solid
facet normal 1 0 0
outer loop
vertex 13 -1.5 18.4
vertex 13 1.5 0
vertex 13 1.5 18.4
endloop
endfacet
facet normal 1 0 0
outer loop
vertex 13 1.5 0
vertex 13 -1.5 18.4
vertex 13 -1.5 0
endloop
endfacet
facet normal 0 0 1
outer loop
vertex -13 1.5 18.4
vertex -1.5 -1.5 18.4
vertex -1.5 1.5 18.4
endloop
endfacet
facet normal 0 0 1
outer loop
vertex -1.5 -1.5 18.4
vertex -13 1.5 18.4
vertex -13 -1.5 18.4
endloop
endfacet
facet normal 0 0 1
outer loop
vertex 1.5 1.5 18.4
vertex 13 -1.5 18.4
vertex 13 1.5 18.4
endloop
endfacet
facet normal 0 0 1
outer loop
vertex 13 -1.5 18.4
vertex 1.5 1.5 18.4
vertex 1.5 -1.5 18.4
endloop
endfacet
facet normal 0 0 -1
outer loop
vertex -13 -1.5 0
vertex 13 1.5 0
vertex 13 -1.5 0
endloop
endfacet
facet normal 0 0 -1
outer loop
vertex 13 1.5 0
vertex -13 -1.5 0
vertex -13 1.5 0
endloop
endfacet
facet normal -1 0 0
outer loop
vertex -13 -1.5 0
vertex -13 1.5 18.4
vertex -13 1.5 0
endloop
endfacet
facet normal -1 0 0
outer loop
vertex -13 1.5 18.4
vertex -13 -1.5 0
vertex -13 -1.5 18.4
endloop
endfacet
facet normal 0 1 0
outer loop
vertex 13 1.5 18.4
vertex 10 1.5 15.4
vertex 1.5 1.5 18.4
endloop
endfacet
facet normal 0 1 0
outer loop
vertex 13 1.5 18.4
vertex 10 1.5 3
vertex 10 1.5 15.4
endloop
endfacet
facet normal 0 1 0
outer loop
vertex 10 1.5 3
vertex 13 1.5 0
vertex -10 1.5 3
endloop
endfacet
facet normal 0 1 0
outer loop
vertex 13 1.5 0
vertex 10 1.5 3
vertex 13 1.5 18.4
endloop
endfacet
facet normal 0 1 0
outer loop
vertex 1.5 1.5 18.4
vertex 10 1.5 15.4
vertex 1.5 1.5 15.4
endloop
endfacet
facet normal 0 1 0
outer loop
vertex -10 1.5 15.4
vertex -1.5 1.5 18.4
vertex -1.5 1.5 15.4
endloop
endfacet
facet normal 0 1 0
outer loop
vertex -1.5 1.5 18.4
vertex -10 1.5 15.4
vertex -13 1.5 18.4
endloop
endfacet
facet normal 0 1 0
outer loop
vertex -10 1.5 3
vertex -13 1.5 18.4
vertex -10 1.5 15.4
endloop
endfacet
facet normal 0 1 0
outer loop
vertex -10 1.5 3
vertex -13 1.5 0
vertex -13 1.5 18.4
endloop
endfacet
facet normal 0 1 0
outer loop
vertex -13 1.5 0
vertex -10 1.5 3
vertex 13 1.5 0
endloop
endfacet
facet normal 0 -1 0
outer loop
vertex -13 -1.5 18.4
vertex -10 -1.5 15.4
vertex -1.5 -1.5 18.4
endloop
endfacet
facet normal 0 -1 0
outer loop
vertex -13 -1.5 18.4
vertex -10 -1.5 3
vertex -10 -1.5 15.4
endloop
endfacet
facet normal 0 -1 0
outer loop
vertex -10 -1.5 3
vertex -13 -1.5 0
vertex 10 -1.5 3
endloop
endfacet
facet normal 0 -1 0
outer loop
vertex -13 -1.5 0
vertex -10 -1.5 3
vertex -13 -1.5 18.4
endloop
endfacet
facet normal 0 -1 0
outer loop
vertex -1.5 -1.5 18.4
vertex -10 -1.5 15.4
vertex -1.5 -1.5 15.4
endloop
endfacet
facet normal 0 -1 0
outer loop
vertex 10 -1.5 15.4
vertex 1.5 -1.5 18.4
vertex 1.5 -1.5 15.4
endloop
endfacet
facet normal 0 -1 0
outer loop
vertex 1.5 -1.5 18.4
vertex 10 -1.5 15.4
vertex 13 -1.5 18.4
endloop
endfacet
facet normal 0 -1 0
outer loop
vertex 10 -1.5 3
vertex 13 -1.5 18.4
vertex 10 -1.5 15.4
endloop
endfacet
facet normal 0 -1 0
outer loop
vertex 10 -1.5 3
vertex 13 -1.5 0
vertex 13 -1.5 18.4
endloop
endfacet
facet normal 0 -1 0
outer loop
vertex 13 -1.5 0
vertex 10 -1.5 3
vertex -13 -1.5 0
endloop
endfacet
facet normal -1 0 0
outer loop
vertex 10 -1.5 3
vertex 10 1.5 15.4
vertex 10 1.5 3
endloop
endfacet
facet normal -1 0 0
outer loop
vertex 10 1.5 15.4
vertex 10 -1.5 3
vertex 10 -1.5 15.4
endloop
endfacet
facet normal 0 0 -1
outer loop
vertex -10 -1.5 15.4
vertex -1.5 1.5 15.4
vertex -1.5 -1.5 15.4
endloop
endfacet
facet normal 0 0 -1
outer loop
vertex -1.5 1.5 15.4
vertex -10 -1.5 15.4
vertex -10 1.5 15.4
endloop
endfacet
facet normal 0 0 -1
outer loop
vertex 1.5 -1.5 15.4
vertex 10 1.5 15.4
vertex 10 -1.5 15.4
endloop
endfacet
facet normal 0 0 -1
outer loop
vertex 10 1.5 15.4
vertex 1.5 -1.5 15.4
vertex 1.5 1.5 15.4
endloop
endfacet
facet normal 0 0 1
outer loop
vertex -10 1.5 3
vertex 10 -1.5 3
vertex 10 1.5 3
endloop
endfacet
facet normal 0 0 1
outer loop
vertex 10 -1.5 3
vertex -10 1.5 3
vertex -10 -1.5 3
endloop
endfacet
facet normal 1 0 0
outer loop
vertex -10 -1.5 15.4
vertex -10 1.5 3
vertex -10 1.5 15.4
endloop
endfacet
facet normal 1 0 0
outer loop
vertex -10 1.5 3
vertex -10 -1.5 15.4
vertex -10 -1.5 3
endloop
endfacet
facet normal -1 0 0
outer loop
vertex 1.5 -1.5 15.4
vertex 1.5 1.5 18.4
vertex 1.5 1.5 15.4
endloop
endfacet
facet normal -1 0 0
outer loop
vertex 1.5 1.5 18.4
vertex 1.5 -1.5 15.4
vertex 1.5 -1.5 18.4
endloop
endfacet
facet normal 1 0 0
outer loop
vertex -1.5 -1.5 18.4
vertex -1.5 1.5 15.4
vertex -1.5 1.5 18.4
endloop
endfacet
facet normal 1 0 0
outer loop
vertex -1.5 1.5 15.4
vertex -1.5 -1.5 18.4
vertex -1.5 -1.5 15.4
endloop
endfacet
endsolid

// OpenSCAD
$fs=0.5;
$fa=5;

use <parts.scad>

th = 3;

// cube for mounting on/off switch
module switch_mount() {
  difference() {
    translate([0, 0, (12.4+th*2)/2])
    cube([20+th*2, th, 12.4+th*2], center=true);
    translate([0, 0, (12.4+th*2)/2])
    cube([20, th*2, 12.4], center=true);
    translate([0, 0, 12.4+th*2])
    cube([th, th*2, th*3], center=true);
  }
}

switch_mount();
